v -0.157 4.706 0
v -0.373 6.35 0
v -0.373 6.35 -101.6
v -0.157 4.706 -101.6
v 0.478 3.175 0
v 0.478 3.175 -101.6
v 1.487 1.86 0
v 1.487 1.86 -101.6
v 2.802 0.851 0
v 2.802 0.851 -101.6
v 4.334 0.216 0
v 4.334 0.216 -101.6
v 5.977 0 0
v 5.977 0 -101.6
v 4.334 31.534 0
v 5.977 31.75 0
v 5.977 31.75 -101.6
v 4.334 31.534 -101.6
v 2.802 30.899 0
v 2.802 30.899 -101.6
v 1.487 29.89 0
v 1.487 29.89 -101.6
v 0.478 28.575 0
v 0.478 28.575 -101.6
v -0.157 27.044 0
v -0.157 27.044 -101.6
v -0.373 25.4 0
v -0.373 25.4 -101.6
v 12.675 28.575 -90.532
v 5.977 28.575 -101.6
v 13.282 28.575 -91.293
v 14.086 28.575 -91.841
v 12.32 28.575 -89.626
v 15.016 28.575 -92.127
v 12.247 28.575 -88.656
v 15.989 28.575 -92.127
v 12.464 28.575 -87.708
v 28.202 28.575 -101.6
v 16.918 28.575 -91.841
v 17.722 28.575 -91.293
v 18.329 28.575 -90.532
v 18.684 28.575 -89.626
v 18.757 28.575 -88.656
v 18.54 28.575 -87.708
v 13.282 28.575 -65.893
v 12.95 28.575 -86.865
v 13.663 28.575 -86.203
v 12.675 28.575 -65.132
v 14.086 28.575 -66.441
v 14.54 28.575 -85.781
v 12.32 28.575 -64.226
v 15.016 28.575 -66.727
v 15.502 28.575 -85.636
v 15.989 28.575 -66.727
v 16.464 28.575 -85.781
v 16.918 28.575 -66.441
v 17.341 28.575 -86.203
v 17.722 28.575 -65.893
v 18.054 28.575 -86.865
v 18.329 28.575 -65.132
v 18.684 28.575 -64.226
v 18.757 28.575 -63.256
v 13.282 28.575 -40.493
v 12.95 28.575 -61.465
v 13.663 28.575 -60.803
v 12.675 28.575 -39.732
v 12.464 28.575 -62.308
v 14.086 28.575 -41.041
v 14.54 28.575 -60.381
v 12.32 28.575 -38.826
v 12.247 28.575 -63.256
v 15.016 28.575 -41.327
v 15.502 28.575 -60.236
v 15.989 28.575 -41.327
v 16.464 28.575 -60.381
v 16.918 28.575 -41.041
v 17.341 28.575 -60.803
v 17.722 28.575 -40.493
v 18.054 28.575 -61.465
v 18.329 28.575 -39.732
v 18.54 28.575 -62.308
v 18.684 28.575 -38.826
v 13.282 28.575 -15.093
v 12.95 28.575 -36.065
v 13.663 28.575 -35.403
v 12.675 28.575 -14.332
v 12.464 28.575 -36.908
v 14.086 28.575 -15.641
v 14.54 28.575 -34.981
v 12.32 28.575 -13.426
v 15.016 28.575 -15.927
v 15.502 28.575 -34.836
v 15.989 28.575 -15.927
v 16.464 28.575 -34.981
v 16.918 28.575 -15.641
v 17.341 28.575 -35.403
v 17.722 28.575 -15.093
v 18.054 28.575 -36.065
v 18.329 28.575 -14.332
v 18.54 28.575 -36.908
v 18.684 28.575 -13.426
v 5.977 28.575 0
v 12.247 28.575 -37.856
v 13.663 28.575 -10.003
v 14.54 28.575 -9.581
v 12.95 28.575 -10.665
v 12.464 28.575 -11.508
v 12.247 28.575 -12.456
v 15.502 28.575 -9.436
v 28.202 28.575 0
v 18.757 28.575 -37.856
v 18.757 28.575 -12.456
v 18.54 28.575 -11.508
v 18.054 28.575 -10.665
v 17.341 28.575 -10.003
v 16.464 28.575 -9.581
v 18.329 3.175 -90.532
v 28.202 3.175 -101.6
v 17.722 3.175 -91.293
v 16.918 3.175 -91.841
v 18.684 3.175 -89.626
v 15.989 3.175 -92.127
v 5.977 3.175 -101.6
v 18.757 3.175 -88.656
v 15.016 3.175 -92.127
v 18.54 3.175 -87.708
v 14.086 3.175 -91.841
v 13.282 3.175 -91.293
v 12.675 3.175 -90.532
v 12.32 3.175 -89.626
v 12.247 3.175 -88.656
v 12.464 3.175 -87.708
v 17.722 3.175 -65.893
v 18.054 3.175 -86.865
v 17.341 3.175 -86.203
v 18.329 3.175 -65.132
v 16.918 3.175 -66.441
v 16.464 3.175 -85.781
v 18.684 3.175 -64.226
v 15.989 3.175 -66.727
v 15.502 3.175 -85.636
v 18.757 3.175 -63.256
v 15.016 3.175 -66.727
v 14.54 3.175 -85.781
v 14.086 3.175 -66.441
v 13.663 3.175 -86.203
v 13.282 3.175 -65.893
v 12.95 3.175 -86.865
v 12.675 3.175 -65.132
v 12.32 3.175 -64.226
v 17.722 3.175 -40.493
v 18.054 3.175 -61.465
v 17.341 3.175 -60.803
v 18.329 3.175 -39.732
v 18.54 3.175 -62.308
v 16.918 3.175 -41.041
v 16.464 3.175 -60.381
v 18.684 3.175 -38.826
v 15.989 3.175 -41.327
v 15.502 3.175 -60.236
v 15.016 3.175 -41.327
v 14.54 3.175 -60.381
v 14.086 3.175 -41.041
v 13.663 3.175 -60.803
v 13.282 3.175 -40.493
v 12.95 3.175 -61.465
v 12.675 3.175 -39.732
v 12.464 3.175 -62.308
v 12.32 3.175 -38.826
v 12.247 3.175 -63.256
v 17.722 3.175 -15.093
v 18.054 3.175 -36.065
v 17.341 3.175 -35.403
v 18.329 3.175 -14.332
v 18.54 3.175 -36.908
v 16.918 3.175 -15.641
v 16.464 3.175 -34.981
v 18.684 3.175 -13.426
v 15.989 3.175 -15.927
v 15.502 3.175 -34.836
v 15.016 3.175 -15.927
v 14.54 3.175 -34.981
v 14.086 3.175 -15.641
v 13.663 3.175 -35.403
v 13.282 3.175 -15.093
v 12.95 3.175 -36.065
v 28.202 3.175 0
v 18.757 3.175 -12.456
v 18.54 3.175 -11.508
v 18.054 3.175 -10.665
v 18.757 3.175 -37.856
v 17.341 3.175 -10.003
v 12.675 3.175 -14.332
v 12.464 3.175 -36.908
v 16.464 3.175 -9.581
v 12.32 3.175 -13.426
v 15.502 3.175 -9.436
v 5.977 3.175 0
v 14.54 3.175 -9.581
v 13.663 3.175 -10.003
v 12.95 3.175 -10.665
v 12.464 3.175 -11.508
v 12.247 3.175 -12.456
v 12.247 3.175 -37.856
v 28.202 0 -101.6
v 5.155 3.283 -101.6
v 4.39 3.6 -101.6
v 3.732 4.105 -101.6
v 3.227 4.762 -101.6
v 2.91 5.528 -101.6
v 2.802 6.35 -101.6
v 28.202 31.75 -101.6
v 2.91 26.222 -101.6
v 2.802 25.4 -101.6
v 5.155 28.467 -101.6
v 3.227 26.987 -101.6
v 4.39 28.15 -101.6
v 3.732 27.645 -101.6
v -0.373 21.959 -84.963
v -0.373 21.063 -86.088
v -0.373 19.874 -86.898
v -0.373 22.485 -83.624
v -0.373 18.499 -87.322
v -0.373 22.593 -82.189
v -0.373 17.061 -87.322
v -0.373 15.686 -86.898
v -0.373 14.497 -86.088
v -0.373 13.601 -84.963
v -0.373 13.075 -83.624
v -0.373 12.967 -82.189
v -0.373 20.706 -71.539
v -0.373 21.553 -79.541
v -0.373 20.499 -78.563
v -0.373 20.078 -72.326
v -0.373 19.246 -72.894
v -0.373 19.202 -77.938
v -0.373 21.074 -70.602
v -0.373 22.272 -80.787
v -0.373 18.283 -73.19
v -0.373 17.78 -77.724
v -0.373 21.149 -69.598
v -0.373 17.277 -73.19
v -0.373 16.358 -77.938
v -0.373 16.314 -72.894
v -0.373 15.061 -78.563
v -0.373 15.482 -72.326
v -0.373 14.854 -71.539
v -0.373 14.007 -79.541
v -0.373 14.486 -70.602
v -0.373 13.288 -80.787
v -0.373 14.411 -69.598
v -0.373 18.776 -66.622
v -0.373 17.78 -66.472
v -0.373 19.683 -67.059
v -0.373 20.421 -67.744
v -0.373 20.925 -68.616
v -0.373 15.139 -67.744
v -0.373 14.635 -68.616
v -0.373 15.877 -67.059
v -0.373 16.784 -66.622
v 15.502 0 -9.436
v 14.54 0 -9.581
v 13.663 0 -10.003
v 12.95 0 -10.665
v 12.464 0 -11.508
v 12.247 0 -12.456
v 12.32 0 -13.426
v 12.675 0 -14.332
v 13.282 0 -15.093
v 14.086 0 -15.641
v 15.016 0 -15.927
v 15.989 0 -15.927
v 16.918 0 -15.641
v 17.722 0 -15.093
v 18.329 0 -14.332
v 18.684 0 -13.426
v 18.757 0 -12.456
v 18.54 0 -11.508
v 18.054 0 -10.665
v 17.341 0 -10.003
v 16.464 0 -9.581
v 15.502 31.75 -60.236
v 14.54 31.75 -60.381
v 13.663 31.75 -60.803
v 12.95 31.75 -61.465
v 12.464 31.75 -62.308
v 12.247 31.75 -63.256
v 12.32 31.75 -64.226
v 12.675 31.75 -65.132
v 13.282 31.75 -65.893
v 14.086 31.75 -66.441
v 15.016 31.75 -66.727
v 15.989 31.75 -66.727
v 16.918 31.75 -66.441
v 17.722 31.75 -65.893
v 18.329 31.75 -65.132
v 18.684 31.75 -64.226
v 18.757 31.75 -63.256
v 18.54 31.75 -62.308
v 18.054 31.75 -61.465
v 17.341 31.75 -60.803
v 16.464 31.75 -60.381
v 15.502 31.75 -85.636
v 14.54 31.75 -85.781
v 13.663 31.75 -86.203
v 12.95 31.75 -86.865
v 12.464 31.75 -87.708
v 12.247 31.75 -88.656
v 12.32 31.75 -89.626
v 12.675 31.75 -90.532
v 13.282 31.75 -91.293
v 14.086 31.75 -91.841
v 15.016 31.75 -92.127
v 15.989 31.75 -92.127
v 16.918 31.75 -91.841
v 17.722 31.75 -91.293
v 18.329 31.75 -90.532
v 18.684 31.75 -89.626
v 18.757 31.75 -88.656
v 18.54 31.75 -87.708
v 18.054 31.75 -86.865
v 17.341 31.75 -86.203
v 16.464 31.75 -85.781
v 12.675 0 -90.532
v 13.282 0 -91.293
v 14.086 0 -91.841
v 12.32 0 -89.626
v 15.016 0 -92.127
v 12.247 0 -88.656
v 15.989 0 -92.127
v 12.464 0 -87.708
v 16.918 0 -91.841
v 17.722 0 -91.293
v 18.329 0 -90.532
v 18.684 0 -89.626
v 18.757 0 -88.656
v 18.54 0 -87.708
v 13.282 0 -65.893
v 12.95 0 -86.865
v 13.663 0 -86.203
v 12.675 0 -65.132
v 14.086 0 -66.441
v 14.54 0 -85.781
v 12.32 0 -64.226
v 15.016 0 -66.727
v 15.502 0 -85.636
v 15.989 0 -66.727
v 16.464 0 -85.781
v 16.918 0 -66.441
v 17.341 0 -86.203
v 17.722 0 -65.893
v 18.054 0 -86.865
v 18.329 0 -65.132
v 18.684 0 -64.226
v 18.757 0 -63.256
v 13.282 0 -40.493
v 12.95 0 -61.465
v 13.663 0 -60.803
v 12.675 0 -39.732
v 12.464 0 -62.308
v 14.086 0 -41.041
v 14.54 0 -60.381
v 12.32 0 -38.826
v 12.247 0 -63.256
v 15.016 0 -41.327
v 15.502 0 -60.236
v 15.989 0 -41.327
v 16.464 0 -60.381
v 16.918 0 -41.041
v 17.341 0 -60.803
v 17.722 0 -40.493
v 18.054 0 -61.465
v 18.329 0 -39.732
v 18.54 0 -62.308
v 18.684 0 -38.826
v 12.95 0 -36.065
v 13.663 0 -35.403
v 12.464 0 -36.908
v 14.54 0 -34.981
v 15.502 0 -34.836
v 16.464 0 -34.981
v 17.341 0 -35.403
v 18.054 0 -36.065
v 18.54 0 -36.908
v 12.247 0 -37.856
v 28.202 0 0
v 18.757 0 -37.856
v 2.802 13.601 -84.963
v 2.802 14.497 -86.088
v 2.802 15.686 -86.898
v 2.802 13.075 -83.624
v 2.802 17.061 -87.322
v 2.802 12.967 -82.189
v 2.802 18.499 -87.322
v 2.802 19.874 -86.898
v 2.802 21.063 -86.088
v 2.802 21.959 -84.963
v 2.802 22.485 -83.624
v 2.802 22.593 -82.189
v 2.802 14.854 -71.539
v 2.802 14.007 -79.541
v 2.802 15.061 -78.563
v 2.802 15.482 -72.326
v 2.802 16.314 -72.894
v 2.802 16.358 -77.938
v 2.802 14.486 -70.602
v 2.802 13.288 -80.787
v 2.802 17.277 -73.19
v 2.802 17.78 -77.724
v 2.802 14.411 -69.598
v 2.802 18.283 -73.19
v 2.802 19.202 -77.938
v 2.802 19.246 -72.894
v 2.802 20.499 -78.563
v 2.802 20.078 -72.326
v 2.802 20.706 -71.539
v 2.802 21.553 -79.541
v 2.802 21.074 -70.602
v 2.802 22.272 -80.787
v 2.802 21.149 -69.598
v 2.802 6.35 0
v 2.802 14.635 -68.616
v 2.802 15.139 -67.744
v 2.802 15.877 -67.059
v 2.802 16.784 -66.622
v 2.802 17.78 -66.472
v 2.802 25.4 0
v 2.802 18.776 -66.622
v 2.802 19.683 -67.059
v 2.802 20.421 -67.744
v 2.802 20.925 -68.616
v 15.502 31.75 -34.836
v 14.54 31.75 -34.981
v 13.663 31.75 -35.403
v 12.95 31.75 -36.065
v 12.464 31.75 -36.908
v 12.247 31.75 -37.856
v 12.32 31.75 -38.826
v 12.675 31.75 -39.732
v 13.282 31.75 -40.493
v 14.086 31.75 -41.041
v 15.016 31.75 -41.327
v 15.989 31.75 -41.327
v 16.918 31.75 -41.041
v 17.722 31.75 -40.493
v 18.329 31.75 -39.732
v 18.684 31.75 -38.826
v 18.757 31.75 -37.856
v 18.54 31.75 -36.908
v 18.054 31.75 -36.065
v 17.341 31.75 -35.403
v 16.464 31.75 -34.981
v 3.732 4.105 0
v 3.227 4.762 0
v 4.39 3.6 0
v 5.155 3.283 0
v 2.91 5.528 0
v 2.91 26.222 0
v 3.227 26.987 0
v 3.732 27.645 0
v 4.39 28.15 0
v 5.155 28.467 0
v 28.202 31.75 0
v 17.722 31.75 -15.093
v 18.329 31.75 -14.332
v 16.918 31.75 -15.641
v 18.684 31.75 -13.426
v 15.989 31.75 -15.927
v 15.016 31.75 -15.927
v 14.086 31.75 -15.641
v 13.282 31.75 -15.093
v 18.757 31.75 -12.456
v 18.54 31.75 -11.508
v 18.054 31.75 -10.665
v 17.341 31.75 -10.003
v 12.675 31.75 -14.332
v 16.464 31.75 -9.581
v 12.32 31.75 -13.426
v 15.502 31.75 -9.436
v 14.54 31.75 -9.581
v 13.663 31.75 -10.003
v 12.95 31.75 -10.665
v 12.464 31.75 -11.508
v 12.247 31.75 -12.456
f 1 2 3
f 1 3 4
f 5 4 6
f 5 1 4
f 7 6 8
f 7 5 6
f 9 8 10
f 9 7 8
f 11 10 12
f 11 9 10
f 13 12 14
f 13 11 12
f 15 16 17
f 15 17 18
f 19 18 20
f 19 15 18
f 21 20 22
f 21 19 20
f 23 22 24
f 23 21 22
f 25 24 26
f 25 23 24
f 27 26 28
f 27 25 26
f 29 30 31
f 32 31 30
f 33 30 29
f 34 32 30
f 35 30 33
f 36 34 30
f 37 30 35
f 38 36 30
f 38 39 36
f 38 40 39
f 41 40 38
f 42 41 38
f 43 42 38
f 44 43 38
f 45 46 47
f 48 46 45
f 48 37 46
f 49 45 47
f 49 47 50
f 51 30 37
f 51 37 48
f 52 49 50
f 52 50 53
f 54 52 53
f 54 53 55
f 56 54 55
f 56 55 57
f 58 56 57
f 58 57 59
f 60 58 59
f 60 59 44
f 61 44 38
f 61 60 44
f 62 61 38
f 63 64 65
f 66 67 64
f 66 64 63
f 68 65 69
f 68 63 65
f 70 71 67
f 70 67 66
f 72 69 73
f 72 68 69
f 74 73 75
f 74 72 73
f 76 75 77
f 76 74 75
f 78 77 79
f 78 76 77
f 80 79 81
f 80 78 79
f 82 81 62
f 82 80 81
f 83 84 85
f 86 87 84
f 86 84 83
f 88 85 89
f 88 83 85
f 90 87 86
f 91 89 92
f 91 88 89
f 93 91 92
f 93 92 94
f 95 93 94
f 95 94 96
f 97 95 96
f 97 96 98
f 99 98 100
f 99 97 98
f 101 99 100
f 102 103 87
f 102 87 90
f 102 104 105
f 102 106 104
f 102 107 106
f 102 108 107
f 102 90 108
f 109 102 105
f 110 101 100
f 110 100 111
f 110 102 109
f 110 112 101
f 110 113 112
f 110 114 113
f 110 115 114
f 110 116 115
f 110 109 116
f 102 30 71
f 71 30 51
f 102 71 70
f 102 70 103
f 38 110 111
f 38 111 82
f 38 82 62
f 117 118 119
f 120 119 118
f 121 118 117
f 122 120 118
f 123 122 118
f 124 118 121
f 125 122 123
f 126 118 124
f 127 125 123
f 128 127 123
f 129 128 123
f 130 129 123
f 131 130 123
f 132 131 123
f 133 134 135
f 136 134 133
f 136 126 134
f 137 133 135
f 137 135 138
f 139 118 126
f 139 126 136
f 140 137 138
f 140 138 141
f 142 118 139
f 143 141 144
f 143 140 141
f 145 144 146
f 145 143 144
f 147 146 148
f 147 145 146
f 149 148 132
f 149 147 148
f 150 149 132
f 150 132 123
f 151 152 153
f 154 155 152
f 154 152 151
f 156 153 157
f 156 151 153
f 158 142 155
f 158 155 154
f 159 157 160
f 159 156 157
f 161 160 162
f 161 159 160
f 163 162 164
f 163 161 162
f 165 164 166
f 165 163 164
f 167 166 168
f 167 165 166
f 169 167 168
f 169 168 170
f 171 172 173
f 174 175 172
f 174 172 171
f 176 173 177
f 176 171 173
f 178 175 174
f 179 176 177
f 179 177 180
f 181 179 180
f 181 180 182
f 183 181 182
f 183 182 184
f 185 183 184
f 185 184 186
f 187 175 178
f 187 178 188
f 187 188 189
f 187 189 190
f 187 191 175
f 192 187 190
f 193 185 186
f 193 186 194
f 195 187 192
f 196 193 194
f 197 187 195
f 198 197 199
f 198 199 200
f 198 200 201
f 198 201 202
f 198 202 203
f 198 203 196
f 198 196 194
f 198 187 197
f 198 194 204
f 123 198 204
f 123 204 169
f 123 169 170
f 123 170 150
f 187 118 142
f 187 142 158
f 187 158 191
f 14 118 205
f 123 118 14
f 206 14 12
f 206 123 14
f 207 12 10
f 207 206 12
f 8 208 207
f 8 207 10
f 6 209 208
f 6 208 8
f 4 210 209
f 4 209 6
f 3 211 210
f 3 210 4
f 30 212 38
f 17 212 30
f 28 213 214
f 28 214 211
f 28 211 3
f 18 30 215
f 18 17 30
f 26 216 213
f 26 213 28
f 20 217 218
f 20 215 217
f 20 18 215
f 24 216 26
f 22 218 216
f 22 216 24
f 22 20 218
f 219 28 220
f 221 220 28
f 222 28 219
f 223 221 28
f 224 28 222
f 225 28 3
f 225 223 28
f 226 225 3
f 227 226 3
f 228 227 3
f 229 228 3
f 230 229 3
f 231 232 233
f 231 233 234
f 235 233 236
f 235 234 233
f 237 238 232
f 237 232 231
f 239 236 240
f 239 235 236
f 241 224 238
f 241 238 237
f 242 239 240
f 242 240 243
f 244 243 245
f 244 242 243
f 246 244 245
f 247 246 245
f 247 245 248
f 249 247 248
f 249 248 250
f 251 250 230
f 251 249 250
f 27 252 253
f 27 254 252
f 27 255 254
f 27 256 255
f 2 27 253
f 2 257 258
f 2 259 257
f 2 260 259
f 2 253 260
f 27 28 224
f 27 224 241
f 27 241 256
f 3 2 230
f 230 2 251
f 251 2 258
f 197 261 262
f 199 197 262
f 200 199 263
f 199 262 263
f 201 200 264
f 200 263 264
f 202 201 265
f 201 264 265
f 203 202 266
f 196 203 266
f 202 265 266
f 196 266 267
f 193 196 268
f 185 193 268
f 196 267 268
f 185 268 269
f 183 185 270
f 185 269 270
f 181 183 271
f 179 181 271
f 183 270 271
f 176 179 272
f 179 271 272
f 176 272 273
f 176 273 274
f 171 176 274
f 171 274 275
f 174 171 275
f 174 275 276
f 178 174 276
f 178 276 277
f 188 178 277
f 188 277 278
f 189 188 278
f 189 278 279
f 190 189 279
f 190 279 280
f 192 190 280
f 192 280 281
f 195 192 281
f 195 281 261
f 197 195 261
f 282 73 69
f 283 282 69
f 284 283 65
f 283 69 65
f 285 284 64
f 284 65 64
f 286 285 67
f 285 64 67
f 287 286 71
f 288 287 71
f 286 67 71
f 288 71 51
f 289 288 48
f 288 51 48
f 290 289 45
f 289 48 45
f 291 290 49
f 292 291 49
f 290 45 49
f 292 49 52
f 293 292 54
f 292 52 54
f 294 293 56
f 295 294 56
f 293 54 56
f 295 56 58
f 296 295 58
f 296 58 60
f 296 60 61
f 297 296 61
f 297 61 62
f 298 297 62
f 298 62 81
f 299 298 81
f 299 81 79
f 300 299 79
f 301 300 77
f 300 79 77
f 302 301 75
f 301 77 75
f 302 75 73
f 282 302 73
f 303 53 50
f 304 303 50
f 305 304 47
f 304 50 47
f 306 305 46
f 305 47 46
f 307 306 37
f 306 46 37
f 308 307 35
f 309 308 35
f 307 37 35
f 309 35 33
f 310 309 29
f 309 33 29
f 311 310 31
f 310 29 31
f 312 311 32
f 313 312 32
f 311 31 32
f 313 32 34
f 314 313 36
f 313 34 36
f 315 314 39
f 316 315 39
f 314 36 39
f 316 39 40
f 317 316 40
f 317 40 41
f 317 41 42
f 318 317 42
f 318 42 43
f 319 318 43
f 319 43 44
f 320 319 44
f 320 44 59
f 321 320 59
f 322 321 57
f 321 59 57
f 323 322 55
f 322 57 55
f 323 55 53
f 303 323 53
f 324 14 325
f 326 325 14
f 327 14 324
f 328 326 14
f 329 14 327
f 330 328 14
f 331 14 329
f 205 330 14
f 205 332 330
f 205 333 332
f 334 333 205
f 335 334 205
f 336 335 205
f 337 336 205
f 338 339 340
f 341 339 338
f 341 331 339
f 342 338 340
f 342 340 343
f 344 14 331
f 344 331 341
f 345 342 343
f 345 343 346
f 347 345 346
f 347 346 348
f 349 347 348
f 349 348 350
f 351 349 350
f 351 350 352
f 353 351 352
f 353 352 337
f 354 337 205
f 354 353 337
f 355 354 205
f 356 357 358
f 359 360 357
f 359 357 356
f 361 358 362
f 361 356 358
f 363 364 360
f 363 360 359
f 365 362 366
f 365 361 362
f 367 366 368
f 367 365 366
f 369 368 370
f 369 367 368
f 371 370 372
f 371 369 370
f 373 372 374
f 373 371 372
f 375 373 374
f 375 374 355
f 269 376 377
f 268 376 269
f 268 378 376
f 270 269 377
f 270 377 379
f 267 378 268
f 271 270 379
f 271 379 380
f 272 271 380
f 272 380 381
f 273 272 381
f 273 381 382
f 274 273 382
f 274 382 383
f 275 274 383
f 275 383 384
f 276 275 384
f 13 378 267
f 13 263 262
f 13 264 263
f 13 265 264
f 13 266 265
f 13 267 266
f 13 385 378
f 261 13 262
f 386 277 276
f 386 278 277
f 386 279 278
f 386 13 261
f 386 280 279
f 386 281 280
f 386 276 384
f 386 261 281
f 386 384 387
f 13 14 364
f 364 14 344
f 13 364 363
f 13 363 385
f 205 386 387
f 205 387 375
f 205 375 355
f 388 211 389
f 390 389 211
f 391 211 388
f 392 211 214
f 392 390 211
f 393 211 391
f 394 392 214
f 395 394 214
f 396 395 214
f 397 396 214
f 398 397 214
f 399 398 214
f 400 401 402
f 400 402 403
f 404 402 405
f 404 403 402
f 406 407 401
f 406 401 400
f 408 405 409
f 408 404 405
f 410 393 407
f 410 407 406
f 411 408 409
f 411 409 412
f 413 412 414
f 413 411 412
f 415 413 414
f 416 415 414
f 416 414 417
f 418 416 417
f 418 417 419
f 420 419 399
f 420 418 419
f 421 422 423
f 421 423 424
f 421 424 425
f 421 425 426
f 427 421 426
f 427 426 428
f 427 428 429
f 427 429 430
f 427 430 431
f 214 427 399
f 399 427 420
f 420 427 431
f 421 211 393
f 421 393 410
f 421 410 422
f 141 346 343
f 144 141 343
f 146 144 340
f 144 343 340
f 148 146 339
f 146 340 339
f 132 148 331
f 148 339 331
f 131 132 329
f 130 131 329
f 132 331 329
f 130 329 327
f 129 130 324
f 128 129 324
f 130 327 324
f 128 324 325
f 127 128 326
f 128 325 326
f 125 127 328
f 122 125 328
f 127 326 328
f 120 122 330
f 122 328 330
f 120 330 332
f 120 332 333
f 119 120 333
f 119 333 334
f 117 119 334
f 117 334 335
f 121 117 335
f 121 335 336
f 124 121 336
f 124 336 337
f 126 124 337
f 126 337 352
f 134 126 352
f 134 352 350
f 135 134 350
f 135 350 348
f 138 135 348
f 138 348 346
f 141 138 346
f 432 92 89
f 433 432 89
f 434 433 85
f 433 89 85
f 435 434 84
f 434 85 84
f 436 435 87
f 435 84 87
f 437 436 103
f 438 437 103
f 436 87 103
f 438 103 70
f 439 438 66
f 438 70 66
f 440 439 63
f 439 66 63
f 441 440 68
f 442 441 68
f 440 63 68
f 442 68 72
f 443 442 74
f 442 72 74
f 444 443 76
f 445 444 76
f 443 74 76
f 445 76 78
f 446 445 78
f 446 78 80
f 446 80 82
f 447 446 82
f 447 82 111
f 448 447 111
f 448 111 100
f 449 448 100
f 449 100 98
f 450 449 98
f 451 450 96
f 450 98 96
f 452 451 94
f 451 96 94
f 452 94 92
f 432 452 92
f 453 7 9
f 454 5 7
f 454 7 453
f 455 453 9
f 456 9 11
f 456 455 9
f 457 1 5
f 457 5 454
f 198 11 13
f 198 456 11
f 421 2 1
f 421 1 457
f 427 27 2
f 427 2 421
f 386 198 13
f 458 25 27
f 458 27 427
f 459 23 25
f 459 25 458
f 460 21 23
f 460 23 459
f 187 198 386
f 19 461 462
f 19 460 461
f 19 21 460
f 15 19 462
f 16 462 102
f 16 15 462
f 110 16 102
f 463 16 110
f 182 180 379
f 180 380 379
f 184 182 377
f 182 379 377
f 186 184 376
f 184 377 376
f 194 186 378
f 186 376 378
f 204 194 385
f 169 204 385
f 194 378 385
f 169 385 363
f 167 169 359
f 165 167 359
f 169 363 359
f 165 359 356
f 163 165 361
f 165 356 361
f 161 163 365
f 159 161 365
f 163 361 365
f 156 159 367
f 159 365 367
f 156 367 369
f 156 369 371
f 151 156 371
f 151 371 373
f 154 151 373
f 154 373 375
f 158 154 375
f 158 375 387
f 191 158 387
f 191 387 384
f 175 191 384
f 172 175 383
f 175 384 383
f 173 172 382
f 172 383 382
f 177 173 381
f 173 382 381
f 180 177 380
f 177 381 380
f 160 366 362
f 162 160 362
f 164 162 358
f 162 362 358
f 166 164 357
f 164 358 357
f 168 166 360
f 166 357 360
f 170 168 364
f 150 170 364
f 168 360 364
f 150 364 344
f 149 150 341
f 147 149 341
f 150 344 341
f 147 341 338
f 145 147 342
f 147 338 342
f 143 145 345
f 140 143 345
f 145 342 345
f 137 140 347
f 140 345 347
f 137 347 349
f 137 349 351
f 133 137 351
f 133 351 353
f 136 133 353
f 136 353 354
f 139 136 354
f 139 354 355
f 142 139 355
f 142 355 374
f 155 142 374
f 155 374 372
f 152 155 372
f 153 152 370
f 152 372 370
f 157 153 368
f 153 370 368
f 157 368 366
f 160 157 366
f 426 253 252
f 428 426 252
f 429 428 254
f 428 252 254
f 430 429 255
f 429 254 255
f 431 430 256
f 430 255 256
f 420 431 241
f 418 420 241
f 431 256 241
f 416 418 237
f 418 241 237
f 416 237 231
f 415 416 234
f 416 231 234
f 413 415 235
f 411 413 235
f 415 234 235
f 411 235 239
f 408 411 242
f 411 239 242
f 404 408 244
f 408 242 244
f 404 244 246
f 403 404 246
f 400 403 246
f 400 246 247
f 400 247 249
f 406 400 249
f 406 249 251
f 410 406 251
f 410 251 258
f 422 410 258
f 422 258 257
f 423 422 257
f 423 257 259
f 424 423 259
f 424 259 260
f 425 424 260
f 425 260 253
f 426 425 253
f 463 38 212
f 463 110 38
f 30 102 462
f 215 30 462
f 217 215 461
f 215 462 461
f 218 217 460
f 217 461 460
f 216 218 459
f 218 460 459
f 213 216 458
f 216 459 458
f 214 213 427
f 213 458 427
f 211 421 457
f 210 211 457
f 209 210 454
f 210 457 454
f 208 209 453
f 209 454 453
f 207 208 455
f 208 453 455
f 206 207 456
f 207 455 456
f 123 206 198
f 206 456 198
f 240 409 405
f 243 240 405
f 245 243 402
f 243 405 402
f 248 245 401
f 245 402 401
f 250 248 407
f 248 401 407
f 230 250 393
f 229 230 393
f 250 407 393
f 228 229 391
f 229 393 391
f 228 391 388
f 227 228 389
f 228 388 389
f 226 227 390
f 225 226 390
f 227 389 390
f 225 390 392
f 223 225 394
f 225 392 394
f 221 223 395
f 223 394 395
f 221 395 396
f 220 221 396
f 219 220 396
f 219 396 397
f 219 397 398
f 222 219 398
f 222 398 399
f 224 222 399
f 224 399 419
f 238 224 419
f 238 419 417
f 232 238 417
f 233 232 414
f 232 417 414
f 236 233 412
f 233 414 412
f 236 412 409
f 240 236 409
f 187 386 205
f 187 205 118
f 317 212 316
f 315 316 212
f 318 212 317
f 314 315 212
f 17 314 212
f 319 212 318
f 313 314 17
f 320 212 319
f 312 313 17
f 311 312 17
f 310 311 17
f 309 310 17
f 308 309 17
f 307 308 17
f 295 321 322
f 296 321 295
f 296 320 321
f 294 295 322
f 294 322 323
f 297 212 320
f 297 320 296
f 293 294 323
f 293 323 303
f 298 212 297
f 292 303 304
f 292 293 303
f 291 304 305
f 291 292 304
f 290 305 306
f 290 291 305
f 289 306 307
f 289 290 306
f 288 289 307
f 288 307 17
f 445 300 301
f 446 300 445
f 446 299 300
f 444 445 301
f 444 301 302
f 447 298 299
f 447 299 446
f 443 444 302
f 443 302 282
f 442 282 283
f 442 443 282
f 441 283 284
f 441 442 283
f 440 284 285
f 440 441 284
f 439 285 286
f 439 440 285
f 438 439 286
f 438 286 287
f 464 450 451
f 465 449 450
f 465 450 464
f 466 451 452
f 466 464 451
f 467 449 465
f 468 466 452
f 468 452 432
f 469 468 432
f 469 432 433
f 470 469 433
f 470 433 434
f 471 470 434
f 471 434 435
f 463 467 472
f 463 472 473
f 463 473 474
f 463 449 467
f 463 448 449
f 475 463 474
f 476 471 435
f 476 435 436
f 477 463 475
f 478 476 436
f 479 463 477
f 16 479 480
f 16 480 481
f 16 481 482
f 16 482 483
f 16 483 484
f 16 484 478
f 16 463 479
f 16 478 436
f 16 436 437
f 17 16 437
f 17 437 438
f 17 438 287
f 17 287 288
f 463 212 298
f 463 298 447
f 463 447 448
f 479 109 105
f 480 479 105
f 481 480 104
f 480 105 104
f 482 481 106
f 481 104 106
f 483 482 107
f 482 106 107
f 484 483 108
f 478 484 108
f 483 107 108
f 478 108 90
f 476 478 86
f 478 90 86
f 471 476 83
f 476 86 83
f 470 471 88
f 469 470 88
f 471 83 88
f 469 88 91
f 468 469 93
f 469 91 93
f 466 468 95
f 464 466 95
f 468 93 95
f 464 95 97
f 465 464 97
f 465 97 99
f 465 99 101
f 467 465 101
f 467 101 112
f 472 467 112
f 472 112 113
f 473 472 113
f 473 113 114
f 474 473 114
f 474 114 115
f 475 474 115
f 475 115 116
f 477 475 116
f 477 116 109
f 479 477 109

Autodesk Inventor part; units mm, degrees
ref_plane "YZ Plane" through (0, 0, 0) normal (1, 0, 0) x (0, 1, 0)
ref_plane "XZ Plane" through (0, 0, 0) normal (0, 1, 0) x (-1, 0, 0)
ref_plane "XY Plane" through (0, 0, 0) normal (0, 0, 1) x (1, 0, 0)
sketch "Sketch1" plane through (0, 0, 0) normal (0, 0, 1) x (1, 0, 0)
  line L0 (5.9771, 0) -> (28.2021, 0)
  line L1 (28.2021, 0) -> (28.2021, 3.175)
  line L2 (28.2021, 3.175) -> (5.9771, 3.175)
  line L3 (2.8021, 6.35) -> (2.8021, 25.4)
  line L4 (5.9771, 28.575) -> (28.2021, 28.575)
  line L5 (28.2021, 28.575) -> (28.2021, 31.75)
  line L6 (28.2021, 31.75) -> (5.9771, 31.75)
  line L7 (-0.3729, 25.4) -> (-0.3729, 6.35)
  arc A0 (5.9771, 28.575) -> (2.8021, 25.4) centre (5.9771, 25.4) ccw
  arc A1 (2.8021, 6.35) -> (5.9771, 3.175) centre (5.9771, 6.35) ccw
  arc A2 (5.9771, 31.75) -> (-0.3729, 25.4) centre (5.9771, 25.4) ccw
  arc A3 (-0.3729, 6.35) -> (5.9771, 0) centre (5.9771, 6.35) ccw
  point P0 (0, 0)
  point P1 (-0.3729, 0)
  point P2 (2.8021, 3.175)
  point P3 (2.8021, 28.575)
  dimension "d0" = 28.575
  dimension "d1" = 3.175
  dimension "d2" = 25.4
  dimension "d3" = 25.4
  dimension "d4" = 3.175
  dimension "d5" = 3.175
  dimension "d6" = 6.35
extrude "Extrusion1" add sketch "Sketch1" against normal blind 889
sketch "Sketch2" plane through (-0.3729, 6.35, 0) normal (-1, 0, 0) x (0, 0, 1)
  line L0 (0, 19.05) -> (-889, 19.05) projected
  line L1 (-228.6, 0) -> (-228.6, 7.9375)
  arc A0 (-228.6, 11.1125) -> (-228.6, 7.9375) centre (-228.6, 9.525) ccw
  line L2 (-228.6, 11.1125) -> (-228.6, 19.05)
  line L3 (-228.6, 19.05) -> (-889, 19.05)
  line L4 (-889, 0) -> (-889, 19.05)
  line L5 (-889, 0) -> (-228.6, 0)
  circle A1 centre (-552.45, 11.43) radius 4.826
  circle A2 centre (-501.65, 11.43) radius 4.826
  circle A3 centre (-387.35, 11.43) radius 4.826
  circle A4 centre (-336.55, 11.43) radius 4.826
  circle A5 centre (-444.5, 7.62) radius 4.826
  circle A6 centre (-730.25, 11.43) radius 4.826
  circle A7 centre (-781.05, 11.43) radius 4.826
  line L6 (0, 25.4) -> (-889, 25.4) construction
  circle A8 centre (-133.35, 11.43) radius 4.826
  circle A9 centre (-82.55, 11.43) radius 4.826
  point P0 (0, -6.35)
  point P1 (-254, 0.852)
  dimension "d10" = 7.62
  dimension "d11" = 3.81
  dimension "d14" = 254
hole "Hole1" at (-0.3729, 17.78, -781.05) at (-0.3729, 17.78, -730.25) at (-0.3729, 17.78, -552.45) at (-0.3729, 17.78, -501.65) at (-0.3729, 13.97, -444.5) at (-0.3729, 17.78, -387.35) at (-0.3729, 17.78, -336.55) at (-0.3729, 17.78, -133.35) at (-0.3729, 17.78, -82.55) direction (1, 0, 0) diameter 9.652 end through all
hole "Hole2" at (-0.3729, 15.875, -228.6) direction (1, 0, 0) diameter 3.175 end through all
sketch "Sketch3" plane through (5.9771, 31.75, 0) normal (0, 1, 0) x (1, 0, 0)
  line L0 (22.225, 889) -> (0, 889) projected
  line L1 (22.225, 0) -> (22.225, 889) projected
  point P0 (-5.9771, 0)
  point P1 (9.525, 876.3)
  dimension "d34" = 12.7
  dimension "d35" = 12.7
hole "Hole3" at (15.5021, 31.75, -876.3) direction (0, -1, 0) diameter 6.5278 end through all
pattern_linear "Rectangular Pattern1" count 35 spacing 25.4 along (0, 0, 1) of "Hole3"
sketch "Sketch4" plane through (0, 0, -889) normal (0, 0, -1) x (-1, 0, 0)
  line L0 (-28.2021, 0) -> (-28.2021, 3.175) projected
  line L1 (-5.9771, 0) -> (-28.2021, 0) projected
  arc A0 (-5.9771, 0) -> (0.3729, 6.35) centre (-5.9771, 6.35) ccw projected
  line L2 (0.3729, 25.4) -> (0.3729, 6.35) projected
  arc A1 (0.3729, 25.4) -> (-5.9771, 31.75) centre (-5.9771, 25.4) ccw projected
  line L3 (-28.2021, 31.75) -> (-5.9771, 31.75) projected
  line L4 (-28.2021, 28.575) -> (-28.2021, 31.75) projected
  line L5 (-5.9771, 28.575) -> (-28.2021, 28.575) projected
  arc A2 (-2.8021, 25.4) -> (-5.9771, 28.575) centre (-5.9771, 25.4) ccw projected
  line L6 (-2.8021, 6.35) -> (-2.8021, 25.4) projected
  arc A3 (-5.9771, 3.175) -> (-2.8021, 6.35) centre (-5.9771, 6.35) ccw projected
  line L7 (-28.2021, 3.175) -> (-5.9771, 3.175) projected
  point P0 (0, 0)
extrude "Extrusion2" cut sketch "Sketch4" against normal blind 787.4
sketch "Sketch5" plane through (-0.3729, 6.35, 0) normal (-1, 0, 0) x (0, 0, 1)
  line L0 (0, 19.05) -> (-101.6, 19.05) projected
  circle A0 centre (-82.55, 11.43) radius 4.826 projected
  circle A1 centre (-69.85, 11.43) radius 3.3782
  line L1 (-82.55, 11.43) -> (-69.85, 11.43) construction
  point P0 (0, -6.35)
  dimension "d48" = 6.7564
  dimension "d49" = 12.7
extrude "Extrusion3" cut sketch "Sketch5" against normal blind 25.4 contours A1
equation "\"d35\" = d34"
properties part number "C Channel Mechanical Stop"
